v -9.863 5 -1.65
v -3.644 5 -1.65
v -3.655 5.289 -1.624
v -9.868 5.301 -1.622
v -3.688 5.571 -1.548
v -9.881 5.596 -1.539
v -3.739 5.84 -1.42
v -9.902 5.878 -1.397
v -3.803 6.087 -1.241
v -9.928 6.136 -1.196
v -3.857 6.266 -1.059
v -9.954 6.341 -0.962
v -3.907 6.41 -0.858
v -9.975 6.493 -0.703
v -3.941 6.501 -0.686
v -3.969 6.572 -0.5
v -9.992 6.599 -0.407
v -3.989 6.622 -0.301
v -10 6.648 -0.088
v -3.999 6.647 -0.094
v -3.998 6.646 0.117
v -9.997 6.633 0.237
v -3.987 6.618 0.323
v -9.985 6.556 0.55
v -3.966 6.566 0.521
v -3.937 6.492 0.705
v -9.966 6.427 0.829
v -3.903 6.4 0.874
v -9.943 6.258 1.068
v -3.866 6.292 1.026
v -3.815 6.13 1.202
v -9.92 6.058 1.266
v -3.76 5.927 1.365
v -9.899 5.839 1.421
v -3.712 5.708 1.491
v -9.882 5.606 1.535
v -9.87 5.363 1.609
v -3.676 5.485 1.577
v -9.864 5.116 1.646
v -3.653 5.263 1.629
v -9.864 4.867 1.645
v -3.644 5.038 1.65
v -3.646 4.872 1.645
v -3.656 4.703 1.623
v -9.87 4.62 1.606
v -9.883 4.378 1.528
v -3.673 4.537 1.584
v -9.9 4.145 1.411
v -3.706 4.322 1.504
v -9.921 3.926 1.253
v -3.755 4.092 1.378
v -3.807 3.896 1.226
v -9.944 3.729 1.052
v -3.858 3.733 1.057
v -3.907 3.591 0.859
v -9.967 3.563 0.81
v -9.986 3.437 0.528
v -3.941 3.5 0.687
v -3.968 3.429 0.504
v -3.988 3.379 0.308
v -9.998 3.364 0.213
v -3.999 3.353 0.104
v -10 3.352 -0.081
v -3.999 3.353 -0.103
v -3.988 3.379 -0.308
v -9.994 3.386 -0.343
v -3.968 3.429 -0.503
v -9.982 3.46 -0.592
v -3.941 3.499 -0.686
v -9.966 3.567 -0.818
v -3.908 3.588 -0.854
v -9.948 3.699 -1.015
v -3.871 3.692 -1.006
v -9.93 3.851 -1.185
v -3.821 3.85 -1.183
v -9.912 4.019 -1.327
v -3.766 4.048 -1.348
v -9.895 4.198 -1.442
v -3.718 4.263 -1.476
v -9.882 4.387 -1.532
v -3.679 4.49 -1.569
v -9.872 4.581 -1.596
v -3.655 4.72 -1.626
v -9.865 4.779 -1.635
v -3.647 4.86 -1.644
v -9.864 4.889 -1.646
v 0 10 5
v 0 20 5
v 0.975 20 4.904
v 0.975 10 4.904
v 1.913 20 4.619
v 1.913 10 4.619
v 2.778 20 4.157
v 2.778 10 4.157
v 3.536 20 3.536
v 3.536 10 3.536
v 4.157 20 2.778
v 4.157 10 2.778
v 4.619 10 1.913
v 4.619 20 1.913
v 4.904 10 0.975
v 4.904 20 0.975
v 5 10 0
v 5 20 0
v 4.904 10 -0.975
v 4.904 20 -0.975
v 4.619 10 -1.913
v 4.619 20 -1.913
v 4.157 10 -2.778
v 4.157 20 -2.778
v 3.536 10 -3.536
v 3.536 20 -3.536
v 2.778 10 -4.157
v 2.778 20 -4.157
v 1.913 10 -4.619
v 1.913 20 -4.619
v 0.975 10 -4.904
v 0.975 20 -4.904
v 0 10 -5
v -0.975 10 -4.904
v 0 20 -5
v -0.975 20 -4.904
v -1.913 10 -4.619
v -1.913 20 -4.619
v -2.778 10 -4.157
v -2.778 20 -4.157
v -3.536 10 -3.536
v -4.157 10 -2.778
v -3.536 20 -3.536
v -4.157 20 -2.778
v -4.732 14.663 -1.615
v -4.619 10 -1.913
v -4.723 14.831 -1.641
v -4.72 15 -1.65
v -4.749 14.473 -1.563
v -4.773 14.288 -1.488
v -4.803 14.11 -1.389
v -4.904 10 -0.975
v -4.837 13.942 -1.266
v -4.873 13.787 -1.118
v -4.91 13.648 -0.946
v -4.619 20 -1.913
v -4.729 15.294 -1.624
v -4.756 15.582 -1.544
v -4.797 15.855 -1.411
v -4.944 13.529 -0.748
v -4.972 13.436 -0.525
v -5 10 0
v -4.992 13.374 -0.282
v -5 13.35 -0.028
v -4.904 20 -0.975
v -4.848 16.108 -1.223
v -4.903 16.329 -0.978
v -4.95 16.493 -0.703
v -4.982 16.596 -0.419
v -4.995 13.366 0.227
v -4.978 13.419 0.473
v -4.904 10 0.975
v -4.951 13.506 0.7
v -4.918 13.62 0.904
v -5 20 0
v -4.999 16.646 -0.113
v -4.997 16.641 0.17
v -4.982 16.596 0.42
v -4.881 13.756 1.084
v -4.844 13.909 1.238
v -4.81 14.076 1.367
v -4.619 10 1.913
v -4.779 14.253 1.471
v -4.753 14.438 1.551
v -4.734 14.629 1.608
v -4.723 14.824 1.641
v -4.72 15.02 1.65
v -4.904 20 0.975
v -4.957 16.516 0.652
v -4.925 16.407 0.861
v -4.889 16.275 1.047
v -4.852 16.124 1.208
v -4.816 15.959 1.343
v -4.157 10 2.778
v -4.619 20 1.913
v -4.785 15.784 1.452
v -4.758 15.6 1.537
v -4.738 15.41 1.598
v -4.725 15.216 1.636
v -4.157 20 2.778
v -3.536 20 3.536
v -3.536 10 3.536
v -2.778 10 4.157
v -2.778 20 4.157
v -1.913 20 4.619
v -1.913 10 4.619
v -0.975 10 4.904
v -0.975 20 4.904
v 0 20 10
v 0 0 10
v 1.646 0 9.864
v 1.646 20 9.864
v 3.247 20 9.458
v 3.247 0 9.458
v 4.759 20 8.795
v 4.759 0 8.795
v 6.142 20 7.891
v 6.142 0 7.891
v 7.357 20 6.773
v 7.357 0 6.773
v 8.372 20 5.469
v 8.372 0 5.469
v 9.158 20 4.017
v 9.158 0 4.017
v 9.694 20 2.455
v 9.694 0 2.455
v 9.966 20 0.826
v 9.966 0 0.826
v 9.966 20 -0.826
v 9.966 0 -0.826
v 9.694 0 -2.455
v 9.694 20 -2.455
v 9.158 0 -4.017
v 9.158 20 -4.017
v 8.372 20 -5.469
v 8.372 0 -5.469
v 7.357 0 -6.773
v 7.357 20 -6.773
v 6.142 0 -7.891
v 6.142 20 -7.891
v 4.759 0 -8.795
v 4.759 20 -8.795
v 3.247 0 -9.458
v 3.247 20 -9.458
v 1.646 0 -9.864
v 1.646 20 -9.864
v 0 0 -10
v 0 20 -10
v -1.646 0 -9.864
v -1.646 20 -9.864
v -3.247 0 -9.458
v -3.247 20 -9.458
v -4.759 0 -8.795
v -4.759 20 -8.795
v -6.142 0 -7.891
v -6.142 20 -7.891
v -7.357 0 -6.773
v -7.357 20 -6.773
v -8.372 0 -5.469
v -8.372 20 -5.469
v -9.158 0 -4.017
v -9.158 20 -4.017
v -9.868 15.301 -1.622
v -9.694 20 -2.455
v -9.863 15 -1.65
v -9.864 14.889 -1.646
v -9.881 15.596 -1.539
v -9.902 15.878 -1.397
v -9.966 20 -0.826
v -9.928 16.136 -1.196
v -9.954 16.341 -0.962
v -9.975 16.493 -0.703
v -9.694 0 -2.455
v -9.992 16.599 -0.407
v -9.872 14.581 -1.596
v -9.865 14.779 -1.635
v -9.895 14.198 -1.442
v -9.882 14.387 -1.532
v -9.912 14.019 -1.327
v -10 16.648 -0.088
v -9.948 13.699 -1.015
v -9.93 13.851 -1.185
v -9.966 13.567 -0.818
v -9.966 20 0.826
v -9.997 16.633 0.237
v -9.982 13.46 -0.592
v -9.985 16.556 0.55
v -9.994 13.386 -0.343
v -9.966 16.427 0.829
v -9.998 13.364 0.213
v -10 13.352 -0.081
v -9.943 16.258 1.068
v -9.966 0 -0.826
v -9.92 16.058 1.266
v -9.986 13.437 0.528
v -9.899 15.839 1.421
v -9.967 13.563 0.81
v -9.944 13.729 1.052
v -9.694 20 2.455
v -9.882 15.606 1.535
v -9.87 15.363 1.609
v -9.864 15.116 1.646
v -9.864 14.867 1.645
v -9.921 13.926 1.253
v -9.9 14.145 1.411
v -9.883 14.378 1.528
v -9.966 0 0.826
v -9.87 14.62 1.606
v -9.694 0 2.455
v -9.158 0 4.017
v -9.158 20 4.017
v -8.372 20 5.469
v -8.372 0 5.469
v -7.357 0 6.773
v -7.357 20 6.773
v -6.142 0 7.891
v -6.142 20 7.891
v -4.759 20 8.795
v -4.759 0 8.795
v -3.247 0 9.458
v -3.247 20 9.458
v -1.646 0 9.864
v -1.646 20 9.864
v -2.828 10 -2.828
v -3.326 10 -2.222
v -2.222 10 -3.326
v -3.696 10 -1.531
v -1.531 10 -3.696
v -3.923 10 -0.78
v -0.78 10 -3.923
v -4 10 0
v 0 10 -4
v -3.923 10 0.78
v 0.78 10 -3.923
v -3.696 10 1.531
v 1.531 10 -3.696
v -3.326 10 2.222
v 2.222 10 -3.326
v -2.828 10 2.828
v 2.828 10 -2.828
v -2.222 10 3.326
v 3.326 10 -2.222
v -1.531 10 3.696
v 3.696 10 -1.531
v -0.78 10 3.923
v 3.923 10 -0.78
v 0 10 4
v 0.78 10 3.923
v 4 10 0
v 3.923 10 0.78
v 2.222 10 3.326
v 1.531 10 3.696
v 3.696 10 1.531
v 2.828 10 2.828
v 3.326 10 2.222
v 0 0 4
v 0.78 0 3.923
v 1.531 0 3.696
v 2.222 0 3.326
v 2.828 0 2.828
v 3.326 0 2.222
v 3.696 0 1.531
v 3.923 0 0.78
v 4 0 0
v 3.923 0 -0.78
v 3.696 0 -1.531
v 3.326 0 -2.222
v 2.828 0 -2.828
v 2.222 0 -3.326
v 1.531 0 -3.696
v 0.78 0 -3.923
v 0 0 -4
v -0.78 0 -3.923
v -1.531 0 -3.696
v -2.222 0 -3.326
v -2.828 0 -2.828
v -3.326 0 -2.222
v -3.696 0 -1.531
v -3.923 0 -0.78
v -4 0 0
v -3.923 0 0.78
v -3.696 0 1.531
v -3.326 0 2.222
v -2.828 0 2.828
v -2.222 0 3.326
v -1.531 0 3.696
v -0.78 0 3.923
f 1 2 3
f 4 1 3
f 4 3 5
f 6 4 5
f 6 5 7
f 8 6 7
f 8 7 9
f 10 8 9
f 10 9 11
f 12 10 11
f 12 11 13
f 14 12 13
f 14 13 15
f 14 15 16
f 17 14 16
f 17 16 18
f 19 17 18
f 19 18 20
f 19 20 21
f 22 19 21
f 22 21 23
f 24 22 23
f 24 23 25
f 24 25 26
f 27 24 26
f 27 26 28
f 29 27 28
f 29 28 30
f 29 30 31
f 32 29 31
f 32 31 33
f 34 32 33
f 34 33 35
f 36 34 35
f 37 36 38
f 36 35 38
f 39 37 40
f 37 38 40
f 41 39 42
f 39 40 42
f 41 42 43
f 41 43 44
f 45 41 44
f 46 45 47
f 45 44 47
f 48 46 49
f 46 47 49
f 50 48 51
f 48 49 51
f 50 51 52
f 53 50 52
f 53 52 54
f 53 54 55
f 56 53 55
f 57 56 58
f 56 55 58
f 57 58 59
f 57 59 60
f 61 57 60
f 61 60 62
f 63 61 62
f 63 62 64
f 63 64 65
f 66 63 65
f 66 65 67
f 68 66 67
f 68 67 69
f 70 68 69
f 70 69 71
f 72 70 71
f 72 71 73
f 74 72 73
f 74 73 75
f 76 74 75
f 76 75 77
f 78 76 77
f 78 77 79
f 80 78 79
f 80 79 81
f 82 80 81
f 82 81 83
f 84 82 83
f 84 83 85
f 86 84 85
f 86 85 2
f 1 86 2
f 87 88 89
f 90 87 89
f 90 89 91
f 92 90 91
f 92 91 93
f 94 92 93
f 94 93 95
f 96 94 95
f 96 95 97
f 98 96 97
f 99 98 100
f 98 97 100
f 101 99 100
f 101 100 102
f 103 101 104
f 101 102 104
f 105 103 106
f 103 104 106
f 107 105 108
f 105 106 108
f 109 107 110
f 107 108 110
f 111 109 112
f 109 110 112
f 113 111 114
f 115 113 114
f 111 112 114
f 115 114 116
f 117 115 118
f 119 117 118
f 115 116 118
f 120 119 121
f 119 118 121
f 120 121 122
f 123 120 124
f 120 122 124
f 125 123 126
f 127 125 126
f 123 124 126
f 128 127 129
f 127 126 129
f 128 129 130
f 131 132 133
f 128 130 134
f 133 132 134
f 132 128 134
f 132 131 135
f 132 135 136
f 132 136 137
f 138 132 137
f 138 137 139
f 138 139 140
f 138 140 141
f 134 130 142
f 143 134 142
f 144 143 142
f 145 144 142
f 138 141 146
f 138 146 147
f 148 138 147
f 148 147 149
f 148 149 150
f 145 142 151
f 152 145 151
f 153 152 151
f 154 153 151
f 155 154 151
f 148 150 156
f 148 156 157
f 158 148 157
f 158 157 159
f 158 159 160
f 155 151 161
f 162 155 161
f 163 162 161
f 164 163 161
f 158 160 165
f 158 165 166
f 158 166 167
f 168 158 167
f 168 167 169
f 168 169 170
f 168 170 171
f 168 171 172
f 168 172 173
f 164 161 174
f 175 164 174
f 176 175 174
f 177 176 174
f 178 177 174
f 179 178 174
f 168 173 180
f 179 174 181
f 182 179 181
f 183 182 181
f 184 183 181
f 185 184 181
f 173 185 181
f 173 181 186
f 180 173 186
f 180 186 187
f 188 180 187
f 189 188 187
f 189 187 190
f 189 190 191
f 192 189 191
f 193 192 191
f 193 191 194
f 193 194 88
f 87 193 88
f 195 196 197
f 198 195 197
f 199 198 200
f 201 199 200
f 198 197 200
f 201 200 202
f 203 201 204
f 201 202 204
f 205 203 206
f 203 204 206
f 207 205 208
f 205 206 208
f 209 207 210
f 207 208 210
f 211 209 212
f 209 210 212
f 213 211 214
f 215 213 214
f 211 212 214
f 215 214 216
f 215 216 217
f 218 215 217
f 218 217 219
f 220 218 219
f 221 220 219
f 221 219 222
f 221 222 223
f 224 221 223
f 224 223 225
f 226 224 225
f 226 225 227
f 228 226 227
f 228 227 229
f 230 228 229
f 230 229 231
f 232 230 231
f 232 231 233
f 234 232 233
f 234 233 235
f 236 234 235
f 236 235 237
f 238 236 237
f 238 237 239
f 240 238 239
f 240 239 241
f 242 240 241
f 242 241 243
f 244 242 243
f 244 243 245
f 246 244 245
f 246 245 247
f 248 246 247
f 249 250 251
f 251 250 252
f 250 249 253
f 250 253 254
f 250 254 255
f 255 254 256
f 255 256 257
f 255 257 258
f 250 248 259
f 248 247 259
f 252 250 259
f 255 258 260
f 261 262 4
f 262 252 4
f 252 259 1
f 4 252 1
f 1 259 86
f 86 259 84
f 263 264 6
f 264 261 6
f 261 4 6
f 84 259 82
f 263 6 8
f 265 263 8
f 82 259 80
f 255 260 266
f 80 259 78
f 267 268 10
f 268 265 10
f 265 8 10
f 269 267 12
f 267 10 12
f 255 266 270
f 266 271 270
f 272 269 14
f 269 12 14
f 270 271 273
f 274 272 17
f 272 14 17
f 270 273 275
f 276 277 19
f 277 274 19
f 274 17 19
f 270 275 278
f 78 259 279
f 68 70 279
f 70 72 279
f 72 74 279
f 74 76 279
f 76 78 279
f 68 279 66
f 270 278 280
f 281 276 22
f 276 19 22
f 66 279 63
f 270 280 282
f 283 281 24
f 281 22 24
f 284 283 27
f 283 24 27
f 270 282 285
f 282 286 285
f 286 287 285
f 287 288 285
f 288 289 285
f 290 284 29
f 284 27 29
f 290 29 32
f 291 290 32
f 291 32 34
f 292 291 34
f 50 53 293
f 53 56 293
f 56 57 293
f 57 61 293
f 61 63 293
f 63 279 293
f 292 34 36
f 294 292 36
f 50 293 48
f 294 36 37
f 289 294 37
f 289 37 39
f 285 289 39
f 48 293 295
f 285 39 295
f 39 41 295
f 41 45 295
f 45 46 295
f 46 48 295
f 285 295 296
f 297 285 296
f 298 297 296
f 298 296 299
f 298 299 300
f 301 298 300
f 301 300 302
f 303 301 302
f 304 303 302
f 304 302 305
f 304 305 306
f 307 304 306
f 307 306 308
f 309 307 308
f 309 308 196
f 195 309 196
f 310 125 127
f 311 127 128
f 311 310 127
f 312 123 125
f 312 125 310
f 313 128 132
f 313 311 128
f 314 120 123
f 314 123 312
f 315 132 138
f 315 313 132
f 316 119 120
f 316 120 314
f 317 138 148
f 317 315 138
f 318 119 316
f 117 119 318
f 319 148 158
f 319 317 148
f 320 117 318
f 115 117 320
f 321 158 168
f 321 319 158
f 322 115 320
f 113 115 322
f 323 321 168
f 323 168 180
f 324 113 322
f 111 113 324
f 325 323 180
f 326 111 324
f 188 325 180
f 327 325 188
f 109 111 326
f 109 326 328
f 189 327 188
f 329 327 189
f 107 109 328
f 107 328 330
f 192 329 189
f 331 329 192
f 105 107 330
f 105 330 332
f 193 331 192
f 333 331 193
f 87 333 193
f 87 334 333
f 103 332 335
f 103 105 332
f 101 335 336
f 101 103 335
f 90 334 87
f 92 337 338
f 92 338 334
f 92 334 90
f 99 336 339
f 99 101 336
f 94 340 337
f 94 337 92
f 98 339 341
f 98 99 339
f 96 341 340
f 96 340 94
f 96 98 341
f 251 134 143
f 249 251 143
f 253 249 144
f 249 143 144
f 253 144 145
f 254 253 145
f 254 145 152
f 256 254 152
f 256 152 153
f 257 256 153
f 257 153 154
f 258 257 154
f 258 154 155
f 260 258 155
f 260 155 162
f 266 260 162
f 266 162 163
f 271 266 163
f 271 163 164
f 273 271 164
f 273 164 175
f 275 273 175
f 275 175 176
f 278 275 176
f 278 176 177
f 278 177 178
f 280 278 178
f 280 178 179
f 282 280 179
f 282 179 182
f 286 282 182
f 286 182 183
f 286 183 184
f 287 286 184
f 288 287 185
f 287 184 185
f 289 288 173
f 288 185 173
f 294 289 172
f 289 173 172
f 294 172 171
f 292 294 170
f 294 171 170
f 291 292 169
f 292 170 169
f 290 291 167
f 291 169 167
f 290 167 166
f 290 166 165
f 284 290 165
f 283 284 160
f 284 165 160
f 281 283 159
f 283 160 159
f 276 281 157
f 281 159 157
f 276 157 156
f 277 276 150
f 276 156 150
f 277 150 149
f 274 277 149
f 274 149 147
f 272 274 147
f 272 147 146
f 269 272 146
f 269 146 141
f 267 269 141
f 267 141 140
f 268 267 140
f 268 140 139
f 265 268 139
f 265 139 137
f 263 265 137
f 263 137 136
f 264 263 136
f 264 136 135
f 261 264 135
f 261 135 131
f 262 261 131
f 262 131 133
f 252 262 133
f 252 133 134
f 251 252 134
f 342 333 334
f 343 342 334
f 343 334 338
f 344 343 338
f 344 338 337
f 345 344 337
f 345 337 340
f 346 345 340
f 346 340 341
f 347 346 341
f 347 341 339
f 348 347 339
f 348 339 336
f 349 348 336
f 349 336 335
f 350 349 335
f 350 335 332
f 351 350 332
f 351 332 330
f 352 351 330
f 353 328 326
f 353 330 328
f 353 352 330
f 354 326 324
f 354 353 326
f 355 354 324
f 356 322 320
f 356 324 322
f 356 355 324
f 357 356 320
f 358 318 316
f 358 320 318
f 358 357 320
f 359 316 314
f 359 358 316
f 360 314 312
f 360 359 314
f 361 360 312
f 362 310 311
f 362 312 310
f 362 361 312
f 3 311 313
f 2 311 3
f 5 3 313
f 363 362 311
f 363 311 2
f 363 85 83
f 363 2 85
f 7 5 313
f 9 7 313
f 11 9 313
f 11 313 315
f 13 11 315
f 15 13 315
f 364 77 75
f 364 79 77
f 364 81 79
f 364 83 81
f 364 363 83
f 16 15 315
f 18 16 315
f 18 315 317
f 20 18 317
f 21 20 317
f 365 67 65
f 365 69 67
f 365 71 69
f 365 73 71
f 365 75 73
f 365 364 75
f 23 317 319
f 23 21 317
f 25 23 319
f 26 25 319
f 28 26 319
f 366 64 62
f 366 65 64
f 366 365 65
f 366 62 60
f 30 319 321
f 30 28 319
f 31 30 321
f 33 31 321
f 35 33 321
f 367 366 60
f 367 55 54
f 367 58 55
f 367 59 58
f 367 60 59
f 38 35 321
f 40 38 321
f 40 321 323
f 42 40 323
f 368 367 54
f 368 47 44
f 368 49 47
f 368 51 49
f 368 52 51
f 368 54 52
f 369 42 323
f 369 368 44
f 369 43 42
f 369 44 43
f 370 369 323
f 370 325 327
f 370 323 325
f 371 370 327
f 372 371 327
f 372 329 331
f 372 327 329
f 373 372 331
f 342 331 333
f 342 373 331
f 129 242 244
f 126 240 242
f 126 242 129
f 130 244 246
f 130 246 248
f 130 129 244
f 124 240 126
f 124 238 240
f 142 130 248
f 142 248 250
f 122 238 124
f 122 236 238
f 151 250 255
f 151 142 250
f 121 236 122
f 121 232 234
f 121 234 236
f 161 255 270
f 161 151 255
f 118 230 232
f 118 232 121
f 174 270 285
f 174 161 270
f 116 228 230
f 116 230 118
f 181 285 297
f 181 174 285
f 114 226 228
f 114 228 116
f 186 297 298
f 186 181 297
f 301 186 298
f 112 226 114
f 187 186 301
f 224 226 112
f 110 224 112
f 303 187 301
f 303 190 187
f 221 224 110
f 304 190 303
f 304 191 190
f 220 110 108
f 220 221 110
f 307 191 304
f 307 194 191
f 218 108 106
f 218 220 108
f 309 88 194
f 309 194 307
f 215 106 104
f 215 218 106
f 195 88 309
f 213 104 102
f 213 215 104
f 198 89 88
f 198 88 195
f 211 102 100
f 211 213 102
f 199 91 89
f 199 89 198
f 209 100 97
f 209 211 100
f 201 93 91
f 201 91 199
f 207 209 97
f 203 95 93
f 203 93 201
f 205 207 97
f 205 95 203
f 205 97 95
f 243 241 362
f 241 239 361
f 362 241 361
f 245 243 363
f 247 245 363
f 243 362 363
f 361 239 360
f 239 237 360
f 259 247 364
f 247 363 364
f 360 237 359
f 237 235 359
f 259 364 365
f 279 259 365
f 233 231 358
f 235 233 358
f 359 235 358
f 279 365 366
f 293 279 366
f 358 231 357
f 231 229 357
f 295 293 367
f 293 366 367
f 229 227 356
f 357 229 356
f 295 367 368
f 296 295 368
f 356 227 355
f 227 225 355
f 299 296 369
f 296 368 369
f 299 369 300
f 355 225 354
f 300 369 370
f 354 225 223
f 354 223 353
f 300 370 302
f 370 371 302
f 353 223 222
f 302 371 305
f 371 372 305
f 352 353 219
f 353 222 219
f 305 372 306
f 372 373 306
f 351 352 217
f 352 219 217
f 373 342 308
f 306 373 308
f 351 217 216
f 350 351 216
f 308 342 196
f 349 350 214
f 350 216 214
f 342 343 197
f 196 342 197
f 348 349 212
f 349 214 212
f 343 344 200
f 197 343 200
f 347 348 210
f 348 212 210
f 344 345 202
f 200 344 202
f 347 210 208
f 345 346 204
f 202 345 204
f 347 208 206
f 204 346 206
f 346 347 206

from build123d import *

# Parameters (mm, degrees)
SKETCH1_R           = 10
SKETCH1_R_2         = 4
BOSS_EXTRUDE1_DEPTH = 20
SKETCH2_R           = 5
CUT_EXTRUDE1_DEPTH  = 10
SKETCH3_R           = 1.65
CUT_EXTRUDE2_DEPTH  = 10


with BuildPart() as part:
    # Sketch1 → Boss-Extrude1 (new body)
    with BuildSketch(Plane(origin=(0, 0, 0), x_dir=(1, 0, 0), z_dir=(0, 1, 0))):
        with Locations(Location((0, 0, 0), (0, 0, 270))):
            Circle(SKETCH1_R)
        with Locations(Location((0, 0, 0), (0, 0, 270))):
            Circle(SKETCH1_R_2, mode=Mode.SUBTRACT)
    extrude(amount=BOSS_EXTRUDE1_DEPTH)

    # Sketch2 → Cut-Extrude1 (cut)
    with BuildSketch(Plane(origin=(0, 20, 0), x_dir=(1, 0, 0), z_dir=(0, 1, 0))):
        with Locations(Location((0, 0, 0), (0, 0, 270))):
            Circle(SKETCH2_R)
    extrude(amount=-CUT_EXTRUDE1_DEPTH, mode=Mode.SUBTRACT)

    # Sketch3 → Cut-Extrude2 (cut)
    with BuildSketch(Plane(origin=(0, 0, 0), x_dir=(0, 0, -1), z_dir=(1, 0, 0))):
        with Locations((0, 5)):
            Circle(SKETCH3_R)
        with Locations((0, 15)):
            Circle(SKETCH3_R)
    extrude(amount=-CUT_EXTRUDE2_DEPTH, mode=Mode.SUBTRACT)


solid = part.part
